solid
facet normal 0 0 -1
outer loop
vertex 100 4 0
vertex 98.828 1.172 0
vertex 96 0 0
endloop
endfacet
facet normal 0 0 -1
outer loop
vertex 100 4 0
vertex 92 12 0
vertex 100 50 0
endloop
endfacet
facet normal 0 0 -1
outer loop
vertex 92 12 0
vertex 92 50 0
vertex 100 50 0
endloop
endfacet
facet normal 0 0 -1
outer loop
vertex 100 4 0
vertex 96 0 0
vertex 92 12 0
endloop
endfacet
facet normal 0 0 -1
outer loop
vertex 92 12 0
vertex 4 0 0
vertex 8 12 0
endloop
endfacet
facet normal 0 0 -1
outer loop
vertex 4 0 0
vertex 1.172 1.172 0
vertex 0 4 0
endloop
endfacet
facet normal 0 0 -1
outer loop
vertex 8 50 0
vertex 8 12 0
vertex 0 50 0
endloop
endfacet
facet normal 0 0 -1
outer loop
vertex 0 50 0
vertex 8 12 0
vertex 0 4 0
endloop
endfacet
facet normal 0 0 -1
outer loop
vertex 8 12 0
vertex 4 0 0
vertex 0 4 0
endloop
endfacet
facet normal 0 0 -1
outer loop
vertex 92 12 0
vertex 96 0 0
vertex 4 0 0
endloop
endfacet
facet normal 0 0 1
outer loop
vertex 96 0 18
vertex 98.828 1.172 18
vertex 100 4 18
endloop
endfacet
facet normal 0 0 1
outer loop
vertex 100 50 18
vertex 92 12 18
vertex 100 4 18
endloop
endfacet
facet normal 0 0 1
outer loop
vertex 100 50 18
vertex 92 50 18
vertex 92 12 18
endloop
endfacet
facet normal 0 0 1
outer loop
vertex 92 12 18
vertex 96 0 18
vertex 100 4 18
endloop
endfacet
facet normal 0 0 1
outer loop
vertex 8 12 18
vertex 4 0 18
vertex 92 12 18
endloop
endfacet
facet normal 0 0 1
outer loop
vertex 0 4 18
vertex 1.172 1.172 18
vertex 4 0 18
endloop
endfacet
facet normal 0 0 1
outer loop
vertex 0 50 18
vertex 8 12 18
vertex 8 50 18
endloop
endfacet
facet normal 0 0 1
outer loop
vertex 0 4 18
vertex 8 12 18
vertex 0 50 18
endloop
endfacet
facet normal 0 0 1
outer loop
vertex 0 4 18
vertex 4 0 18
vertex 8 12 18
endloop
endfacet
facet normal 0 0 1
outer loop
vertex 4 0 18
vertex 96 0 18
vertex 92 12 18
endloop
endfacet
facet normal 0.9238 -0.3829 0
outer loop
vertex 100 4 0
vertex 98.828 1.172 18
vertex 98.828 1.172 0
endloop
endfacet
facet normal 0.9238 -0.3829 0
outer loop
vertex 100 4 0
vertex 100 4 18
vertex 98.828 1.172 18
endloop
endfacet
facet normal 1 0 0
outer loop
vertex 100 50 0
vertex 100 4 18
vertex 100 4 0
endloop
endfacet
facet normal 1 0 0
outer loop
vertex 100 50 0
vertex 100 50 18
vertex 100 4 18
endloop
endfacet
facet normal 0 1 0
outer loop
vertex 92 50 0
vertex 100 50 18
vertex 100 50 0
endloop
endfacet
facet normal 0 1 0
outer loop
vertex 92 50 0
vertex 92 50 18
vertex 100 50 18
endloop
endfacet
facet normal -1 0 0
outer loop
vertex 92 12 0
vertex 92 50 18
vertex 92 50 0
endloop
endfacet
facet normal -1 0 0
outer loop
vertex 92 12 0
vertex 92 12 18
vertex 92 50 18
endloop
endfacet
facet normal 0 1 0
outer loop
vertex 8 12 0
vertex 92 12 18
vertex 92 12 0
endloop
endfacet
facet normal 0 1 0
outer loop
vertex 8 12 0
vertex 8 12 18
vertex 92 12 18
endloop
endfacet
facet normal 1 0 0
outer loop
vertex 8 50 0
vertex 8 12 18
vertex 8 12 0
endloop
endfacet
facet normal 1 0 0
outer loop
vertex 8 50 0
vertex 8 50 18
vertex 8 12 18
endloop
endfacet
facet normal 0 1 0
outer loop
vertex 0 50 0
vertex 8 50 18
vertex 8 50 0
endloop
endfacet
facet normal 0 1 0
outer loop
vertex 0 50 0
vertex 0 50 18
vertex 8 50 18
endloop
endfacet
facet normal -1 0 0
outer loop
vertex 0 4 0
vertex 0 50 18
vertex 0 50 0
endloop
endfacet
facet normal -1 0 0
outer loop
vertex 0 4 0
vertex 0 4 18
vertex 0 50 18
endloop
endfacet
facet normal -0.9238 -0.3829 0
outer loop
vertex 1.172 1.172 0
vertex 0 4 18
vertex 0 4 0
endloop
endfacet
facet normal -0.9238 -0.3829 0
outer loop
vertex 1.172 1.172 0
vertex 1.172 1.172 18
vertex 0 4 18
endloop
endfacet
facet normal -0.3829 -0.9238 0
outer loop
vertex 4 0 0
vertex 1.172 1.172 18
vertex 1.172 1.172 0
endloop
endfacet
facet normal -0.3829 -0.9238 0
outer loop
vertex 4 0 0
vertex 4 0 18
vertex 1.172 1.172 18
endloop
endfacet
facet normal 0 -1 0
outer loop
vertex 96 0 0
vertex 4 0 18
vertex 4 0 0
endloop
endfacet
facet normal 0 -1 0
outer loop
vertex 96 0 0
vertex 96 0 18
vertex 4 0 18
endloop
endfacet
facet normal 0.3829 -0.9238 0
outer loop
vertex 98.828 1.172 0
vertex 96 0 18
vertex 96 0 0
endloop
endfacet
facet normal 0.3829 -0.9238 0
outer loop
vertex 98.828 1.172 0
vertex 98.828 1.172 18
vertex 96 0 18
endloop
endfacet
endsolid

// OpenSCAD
$fn = 32;

// ----------------------------------------------------------------------
// Heat sink frame: 100 x 50 mm frame, 8 mm walls
// ----------------------------------------------------------------------

// --- parameters (mm) ---
profile_height = 18;      // extrusion height
profile_points = 12;      // points of the closed outline

profile = [[0, 4], [1.172, 1.172], [4, 0], [96, 0], [98.828, 1.172], [100, 4], [100, 50], [92, 50], [92, 12], [8, 12], [8, 50], [0, 50]];  // single closed polygon, 12 points, counter clockwise

// --- the one profile operation ---
linear_extrude(height = profile_height) polygon(points = profile);
